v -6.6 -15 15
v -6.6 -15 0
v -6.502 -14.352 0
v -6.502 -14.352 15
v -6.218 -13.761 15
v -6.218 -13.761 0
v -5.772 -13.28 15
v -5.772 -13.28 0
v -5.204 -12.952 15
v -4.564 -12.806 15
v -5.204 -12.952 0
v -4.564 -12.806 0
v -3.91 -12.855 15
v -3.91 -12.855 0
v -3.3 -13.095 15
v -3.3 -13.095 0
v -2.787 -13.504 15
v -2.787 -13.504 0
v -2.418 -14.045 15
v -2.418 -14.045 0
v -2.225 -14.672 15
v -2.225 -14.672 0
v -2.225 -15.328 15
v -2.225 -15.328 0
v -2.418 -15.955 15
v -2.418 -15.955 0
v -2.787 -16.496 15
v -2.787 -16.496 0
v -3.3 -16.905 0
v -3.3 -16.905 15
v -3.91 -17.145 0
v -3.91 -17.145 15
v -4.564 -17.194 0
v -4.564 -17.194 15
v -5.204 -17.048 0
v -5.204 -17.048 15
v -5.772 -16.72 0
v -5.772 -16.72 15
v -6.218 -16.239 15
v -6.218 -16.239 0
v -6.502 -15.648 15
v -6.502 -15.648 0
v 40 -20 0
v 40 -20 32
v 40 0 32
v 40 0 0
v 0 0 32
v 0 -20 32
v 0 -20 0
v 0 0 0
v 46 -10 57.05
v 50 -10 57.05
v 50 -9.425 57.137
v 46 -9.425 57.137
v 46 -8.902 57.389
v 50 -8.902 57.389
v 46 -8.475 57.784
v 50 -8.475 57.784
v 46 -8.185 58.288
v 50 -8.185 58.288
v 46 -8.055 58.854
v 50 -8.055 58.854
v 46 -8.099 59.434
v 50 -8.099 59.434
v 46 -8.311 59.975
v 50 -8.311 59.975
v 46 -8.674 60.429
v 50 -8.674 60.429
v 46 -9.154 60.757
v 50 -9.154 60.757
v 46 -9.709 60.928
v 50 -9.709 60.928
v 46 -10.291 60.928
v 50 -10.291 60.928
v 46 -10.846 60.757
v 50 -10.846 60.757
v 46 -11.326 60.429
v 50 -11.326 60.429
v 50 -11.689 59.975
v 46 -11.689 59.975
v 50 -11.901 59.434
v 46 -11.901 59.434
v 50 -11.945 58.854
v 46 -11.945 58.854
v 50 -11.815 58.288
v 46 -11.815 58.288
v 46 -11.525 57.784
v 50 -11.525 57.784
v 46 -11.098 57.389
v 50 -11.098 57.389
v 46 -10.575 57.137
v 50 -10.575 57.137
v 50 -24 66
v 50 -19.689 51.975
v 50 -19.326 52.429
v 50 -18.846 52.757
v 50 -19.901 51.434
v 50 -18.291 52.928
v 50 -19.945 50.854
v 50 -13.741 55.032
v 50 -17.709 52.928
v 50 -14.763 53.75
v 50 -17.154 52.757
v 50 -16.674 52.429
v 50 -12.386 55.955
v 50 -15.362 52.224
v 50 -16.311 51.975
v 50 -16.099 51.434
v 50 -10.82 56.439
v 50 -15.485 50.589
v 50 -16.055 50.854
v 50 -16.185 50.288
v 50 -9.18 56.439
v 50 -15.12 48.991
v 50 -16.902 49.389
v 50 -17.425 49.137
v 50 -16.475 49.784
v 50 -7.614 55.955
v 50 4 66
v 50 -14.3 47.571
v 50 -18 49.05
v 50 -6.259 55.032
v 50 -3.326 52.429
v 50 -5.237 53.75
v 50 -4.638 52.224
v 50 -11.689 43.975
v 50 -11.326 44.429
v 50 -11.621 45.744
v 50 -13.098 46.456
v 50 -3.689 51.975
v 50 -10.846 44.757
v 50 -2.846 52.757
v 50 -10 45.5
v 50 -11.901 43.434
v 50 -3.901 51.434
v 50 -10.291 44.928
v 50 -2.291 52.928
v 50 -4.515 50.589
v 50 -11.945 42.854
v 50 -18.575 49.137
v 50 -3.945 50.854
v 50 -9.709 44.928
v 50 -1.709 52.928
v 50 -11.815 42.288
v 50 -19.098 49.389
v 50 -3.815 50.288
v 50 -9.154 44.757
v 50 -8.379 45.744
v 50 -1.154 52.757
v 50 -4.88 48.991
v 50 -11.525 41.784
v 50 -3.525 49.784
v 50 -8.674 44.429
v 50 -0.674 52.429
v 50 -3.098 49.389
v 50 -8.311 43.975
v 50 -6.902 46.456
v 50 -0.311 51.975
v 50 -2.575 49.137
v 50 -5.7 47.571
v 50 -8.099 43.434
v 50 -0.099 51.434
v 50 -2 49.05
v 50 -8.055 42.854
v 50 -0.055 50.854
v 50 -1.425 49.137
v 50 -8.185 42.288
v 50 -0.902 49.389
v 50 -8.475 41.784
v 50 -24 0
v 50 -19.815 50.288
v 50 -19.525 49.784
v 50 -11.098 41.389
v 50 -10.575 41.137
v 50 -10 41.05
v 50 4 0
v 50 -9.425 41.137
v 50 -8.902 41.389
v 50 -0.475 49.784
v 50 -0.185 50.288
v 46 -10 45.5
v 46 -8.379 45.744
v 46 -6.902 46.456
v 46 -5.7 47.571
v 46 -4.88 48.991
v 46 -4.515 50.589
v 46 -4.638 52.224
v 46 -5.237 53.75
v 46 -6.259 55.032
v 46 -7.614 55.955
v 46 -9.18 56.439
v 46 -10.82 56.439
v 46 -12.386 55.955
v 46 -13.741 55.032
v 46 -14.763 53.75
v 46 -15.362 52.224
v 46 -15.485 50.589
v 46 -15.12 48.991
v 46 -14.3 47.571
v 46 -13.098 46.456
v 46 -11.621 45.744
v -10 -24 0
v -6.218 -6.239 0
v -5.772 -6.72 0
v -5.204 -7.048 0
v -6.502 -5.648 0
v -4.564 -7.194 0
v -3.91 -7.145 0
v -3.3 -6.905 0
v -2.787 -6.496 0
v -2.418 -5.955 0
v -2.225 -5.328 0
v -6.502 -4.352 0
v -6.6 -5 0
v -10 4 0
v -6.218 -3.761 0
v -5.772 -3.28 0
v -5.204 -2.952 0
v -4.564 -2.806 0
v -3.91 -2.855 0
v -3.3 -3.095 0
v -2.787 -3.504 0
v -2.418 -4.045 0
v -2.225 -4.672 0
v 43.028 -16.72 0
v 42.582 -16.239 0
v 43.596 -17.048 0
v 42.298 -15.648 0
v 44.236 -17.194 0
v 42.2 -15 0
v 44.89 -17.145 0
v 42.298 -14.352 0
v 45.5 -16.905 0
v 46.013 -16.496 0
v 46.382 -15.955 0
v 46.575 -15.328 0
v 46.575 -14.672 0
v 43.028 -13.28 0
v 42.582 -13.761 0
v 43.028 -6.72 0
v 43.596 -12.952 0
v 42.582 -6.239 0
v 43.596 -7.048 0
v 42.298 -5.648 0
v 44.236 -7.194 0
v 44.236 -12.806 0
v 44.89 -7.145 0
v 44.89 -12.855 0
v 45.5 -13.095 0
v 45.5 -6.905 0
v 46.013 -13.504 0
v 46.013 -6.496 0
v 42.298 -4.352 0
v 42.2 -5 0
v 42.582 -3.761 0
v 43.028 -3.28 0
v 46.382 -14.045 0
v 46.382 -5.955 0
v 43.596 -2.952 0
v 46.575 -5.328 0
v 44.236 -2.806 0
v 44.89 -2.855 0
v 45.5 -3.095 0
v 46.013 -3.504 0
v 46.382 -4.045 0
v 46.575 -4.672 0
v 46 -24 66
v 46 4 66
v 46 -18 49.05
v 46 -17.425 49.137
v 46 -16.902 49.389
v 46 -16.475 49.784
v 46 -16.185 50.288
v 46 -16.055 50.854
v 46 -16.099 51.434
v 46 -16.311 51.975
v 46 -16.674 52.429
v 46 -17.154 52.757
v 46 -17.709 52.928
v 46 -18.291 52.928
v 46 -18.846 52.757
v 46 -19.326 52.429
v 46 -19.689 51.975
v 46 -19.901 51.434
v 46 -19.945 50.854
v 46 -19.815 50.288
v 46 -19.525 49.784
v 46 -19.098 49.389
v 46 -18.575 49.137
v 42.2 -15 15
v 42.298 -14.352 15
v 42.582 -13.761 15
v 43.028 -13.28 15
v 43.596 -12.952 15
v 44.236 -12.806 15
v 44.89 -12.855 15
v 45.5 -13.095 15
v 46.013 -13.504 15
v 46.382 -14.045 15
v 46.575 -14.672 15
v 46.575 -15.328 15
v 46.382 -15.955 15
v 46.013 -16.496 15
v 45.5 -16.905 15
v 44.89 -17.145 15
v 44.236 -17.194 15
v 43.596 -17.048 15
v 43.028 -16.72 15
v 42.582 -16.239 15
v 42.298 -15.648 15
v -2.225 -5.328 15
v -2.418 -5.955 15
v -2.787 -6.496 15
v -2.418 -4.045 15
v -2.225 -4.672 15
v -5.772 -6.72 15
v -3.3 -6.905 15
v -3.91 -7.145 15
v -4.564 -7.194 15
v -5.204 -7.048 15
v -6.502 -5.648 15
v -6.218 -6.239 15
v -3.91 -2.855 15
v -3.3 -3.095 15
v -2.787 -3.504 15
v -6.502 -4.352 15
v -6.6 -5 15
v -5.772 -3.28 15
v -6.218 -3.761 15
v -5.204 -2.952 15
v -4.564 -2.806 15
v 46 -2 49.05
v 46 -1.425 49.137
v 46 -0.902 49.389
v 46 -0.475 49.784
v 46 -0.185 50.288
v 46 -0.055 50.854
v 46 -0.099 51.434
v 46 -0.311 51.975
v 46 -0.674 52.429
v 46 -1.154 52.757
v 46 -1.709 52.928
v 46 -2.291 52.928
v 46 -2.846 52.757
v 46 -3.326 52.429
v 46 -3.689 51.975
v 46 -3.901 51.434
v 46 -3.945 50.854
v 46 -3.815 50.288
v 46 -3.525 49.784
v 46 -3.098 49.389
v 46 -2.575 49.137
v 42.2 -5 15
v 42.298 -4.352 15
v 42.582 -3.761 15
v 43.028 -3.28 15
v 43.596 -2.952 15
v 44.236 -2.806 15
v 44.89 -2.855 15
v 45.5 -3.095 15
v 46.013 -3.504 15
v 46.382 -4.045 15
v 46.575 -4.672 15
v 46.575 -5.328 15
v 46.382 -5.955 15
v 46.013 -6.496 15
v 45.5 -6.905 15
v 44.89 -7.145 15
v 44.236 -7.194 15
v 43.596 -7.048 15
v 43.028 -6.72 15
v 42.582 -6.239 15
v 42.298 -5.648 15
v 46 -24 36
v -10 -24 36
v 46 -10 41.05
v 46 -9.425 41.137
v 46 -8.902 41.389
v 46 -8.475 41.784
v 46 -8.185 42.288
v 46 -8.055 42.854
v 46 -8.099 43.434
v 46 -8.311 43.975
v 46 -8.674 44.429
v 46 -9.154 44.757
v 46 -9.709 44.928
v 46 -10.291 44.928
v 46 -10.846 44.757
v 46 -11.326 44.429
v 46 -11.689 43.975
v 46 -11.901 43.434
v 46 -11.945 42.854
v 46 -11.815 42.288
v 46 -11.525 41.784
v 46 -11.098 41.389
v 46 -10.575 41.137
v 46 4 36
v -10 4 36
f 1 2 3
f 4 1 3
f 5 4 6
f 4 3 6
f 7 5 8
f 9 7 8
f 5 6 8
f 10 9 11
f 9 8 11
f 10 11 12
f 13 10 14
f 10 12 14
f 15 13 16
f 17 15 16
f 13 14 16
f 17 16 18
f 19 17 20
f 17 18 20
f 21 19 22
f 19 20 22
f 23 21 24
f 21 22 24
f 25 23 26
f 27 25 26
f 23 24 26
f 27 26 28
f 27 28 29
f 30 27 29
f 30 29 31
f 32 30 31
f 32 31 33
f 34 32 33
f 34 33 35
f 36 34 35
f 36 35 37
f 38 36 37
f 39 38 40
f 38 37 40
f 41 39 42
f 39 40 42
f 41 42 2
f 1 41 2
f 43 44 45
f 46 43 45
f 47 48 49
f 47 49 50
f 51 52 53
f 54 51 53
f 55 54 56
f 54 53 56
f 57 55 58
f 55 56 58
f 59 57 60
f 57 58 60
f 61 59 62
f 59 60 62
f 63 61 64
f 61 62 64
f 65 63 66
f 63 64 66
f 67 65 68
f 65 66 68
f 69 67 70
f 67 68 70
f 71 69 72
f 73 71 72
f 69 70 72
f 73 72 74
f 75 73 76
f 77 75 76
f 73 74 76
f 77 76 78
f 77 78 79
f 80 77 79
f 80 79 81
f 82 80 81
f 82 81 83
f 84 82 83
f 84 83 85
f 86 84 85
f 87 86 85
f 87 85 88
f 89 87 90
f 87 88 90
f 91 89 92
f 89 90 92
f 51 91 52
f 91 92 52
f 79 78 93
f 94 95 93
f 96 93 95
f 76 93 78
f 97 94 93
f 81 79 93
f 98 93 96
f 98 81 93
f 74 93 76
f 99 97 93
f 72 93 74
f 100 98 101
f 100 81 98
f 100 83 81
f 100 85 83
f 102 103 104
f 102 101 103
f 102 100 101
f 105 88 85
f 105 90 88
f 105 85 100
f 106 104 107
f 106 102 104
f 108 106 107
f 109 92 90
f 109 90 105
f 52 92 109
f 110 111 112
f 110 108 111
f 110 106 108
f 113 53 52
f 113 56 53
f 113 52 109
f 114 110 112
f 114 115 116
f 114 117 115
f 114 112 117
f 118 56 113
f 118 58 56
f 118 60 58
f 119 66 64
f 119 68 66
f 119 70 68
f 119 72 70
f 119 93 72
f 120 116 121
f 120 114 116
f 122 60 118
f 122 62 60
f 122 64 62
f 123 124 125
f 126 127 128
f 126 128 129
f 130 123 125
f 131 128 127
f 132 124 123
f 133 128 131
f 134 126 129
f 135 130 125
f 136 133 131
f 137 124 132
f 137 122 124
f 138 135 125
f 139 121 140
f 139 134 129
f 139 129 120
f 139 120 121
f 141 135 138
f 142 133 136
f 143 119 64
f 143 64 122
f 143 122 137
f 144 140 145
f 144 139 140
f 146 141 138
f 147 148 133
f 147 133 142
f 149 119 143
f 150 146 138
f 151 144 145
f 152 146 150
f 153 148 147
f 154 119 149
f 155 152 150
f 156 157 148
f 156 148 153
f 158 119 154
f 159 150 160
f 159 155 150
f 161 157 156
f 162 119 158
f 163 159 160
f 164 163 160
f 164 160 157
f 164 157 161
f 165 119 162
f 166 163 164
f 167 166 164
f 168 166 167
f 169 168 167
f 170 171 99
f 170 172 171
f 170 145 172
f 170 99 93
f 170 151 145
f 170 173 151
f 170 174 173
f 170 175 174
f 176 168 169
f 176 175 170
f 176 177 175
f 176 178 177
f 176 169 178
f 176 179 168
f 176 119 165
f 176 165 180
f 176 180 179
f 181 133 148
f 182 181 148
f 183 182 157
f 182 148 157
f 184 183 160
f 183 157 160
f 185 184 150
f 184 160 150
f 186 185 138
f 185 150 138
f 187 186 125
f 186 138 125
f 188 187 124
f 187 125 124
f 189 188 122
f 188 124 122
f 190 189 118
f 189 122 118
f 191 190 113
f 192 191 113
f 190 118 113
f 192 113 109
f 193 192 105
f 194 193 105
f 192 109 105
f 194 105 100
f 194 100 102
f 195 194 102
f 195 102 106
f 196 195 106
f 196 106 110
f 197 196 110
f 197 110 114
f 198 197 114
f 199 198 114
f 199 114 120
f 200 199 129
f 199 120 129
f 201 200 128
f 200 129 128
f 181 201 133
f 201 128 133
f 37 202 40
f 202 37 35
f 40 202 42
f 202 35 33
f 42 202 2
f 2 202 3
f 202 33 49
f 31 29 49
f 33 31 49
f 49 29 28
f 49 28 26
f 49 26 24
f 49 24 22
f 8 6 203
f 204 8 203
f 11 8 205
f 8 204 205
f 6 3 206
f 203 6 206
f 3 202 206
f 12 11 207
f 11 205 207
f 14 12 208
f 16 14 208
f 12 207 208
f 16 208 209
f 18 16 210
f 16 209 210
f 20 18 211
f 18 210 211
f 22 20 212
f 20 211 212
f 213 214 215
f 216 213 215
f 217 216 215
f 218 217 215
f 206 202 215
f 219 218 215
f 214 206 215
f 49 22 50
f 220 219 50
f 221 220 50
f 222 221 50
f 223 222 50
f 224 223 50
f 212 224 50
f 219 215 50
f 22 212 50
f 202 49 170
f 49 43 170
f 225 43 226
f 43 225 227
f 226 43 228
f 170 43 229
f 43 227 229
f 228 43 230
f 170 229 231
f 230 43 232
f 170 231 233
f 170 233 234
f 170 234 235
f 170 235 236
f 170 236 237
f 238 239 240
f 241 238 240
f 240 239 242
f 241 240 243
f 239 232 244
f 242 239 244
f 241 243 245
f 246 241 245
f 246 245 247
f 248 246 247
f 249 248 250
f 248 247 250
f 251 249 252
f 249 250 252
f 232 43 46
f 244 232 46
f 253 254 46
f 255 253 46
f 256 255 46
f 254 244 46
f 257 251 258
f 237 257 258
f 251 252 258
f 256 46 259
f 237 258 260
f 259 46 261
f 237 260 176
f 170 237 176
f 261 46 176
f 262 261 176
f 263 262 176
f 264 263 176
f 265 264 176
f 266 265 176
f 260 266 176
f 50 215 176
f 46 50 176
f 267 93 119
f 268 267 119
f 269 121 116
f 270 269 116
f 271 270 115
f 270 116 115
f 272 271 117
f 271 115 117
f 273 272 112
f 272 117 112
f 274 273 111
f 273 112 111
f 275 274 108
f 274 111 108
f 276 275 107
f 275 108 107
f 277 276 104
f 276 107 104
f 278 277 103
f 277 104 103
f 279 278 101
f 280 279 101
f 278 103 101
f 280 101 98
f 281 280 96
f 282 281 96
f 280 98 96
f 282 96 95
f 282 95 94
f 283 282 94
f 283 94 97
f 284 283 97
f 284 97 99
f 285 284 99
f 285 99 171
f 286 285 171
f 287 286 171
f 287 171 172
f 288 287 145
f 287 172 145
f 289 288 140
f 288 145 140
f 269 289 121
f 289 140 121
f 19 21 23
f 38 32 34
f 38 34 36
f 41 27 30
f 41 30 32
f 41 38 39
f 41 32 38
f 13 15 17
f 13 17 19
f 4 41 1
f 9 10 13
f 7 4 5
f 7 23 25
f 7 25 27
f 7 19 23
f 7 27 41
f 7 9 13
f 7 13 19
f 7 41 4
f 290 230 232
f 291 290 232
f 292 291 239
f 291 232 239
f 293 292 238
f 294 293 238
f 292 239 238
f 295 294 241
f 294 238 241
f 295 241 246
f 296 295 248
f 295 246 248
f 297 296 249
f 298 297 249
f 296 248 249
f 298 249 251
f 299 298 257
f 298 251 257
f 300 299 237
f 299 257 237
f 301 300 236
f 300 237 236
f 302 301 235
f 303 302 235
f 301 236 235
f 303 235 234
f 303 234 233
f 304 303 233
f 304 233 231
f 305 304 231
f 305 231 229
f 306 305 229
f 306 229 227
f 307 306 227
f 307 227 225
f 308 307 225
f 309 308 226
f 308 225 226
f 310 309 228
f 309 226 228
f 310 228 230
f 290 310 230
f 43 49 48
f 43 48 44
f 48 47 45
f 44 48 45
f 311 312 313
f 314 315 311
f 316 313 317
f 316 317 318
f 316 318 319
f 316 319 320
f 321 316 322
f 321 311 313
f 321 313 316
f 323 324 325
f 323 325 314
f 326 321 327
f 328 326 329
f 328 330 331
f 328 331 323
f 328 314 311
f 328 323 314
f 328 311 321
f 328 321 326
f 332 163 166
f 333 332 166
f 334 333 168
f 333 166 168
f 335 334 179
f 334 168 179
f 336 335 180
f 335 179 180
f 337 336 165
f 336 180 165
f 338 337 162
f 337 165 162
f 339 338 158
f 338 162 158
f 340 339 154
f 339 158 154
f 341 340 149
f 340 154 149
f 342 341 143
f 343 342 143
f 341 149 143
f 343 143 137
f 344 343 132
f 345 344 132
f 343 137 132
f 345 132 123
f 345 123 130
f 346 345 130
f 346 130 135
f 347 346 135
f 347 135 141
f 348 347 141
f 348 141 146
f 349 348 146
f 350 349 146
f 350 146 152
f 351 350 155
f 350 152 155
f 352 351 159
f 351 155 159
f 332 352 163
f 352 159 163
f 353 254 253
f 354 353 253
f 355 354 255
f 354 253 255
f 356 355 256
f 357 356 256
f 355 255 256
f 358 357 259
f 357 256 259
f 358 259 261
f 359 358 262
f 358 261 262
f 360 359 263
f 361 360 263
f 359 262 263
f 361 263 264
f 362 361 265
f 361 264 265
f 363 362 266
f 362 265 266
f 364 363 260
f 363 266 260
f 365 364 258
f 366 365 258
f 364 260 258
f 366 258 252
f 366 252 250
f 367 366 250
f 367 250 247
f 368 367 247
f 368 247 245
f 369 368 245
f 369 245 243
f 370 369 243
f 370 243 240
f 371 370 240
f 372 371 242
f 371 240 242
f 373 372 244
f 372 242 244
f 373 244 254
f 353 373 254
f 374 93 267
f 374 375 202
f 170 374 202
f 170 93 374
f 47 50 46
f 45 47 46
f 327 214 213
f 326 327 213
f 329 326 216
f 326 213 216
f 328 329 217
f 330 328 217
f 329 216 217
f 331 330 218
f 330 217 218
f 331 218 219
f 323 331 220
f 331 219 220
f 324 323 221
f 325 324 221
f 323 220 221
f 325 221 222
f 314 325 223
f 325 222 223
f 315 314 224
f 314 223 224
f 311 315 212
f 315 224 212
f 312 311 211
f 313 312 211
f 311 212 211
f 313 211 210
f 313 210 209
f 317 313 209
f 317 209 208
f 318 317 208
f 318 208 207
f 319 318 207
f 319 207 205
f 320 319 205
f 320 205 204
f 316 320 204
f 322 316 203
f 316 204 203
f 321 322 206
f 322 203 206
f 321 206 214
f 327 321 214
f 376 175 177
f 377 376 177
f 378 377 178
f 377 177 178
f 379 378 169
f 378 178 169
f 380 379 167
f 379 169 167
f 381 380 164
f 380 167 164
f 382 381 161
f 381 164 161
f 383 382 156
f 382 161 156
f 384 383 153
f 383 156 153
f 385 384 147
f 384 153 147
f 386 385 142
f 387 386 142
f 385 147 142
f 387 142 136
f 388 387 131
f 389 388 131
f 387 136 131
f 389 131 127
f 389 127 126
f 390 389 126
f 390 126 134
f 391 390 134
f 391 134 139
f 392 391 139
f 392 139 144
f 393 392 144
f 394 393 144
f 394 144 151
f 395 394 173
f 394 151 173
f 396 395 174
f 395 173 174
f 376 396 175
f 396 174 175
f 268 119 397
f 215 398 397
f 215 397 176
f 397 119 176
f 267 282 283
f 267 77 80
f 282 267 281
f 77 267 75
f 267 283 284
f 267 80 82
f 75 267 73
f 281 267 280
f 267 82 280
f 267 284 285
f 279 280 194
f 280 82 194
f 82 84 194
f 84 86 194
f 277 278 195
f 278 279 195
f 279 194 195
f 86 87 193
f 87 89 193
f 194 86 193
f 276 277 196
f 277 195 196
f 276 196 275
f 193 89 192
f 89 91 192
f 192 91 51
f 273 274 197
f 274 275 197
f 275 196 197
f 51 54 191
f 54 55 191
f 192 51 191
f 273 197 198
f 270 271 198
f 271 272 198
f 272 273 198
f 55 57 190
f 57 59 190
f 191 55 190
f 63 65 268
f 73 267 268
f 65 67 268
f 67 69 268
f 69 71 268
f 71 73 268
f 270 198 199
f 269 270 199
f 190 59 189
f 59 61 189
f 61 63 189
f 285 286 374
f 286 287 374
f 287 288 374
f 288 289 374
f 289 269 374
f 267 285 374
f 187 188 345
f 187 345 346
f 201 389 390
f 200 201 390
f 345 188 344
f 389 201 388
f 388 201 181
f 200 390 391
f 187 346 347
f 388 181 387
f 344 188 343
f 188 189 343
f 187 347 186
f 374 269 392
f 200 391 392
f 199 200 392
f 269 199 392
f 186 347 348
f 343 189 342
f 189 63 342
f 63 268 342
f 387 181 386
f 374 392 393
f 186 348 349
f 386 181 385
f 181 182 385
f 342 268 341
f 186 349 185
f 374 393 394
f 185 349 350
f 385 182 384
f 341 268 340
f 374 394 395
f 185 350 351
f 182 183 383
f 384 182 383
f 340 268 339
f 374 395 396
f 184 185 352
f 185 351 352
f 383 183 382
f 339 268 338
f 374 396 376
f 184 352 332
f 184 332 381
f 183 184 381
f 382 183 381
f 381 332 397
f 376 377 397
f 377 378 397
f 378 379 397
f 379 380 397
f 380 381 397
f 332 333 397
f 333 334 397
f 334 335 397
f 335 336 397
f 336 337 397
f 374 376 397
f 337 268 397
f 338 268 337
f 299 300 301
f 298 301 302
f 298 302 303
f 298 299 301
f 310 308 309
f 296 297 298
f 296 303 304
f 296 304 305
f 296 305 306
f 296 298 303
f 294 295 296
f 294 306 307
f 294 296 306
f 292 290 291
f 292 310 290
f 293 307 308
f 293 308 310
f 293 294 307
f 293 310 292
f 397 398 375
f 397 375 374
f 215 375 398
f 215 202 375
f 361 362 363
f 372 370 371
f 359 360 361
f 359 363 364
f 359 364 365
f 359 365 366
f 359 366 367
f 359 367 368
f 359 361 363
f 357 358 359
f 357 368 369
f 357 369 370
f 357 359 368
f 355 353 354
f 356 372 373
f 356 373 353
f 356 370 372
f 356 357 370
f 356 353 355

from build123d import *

# Parameters (mm, degrees)
SKETCH1_W           = 60
SKETCH1_H           = 28
SKETCH1_W_2         = 40
SKETCH1_H_2         = 20
BOSS_EXTRUDE1_DEPTH = 32
SKETCH2_W           = 60
SKETCH2_H           = 28
BOSS_EXTRUDE2_DEPTH = 4
SKETCH3_W           = 30
SKETCH3_H           = 28
SKETCH3_R           = 5.5
BOSS_EXTRUDE3_DEPTH = 4
SKETCH4_R           = 1.95
CUT_EXTRUDE1_DEPTH  = 4
SKETCH5_R           = 2.2
CUT_EXTRUDE2_DEPTH  = 15


with BuildPart() as part:
    # Sketch1 → Boss-Extrude1 (new body)
    with BuildSketch(Plane.XY):
        with Locations((20, -10)):
            Rectangle(SKETCH1_W, SKETCH1_H)
        with Locations((20, -10)):
            Rectangle(SKETCH1_W_2, SKETCH1_H_2, mode=Mode.SUBTRACT)
    extrude(amount=BOSS_EXTRUDE1_DEPTH)

    # Sketch2 → Boss-Extrude2 (add)
    with BuildSketch(Plane.XY.offset(32)):
        with Locations((20, -10)):
            Rectangle(SKETCH2_W, SKETCH2_H)
    extrude(amount=BOSS_EXTRUDE2_DEPTH)

    # Sketch3 → Boss-Extrude3 (add)
    with BuildSketch(Plane(origin=(50, 0, 0), x_dir=(0, 0, -1), z_dir=(1, 0, 0))):
        with Locations((-51, -10)):
            Rectangle(SKETCH3_W, SKETCH3_H)
        with Locations((-51, -10)):
            Circle(SKETCH3_R, mode=Mode.SUBTRACT)
    extrude(amount=-BOSS_EXTRUDE3_DEPTH)

    # Sketch4 → Cut-Extrude1 (cut)
    with BuildSketch(Plane(origin=(50, 0, 0), x_dir=(0, 0, -1), z_dir=(1, 0, 0))):
        with Locations((-51, -18)):
            Circle(SKETCH4_R)
        with Locations((-59, -10)):
            Circle(SKETCH4_R)
        with Locations((-43, -10)):
            Circle(SKETCH4_R)
        with Locations((-51, -2)):
            Circle(SKETCH4_R)
    extrude(amount=-CUT_EXTRUDE1_DEPTH, mode=Mode.SUBTRACT)

    # Sketch5 → Cut-Extrude2 (cut)
    with BuildSketch(Plane(origin=(0, 0, 0), x_dir=(-1, 0, 0), z_dir=(0, 0, -1))):
        with Locations((-44.4, -5)):
            Circle(SKETCH5_R)
        with Locations((-44.4, -15)):
            Circle(SKETCH5_R)
        with Locations((4.4, -5)):
            Circle(SKETCH5_R)
        with Locations((4.4, -15)):
            Circle(SKETCH5_R)
    extrude(amount=-CUT_EXTRUDE2_DEPTH, mode=Mode.SUBTRACT)


solid = part.part
